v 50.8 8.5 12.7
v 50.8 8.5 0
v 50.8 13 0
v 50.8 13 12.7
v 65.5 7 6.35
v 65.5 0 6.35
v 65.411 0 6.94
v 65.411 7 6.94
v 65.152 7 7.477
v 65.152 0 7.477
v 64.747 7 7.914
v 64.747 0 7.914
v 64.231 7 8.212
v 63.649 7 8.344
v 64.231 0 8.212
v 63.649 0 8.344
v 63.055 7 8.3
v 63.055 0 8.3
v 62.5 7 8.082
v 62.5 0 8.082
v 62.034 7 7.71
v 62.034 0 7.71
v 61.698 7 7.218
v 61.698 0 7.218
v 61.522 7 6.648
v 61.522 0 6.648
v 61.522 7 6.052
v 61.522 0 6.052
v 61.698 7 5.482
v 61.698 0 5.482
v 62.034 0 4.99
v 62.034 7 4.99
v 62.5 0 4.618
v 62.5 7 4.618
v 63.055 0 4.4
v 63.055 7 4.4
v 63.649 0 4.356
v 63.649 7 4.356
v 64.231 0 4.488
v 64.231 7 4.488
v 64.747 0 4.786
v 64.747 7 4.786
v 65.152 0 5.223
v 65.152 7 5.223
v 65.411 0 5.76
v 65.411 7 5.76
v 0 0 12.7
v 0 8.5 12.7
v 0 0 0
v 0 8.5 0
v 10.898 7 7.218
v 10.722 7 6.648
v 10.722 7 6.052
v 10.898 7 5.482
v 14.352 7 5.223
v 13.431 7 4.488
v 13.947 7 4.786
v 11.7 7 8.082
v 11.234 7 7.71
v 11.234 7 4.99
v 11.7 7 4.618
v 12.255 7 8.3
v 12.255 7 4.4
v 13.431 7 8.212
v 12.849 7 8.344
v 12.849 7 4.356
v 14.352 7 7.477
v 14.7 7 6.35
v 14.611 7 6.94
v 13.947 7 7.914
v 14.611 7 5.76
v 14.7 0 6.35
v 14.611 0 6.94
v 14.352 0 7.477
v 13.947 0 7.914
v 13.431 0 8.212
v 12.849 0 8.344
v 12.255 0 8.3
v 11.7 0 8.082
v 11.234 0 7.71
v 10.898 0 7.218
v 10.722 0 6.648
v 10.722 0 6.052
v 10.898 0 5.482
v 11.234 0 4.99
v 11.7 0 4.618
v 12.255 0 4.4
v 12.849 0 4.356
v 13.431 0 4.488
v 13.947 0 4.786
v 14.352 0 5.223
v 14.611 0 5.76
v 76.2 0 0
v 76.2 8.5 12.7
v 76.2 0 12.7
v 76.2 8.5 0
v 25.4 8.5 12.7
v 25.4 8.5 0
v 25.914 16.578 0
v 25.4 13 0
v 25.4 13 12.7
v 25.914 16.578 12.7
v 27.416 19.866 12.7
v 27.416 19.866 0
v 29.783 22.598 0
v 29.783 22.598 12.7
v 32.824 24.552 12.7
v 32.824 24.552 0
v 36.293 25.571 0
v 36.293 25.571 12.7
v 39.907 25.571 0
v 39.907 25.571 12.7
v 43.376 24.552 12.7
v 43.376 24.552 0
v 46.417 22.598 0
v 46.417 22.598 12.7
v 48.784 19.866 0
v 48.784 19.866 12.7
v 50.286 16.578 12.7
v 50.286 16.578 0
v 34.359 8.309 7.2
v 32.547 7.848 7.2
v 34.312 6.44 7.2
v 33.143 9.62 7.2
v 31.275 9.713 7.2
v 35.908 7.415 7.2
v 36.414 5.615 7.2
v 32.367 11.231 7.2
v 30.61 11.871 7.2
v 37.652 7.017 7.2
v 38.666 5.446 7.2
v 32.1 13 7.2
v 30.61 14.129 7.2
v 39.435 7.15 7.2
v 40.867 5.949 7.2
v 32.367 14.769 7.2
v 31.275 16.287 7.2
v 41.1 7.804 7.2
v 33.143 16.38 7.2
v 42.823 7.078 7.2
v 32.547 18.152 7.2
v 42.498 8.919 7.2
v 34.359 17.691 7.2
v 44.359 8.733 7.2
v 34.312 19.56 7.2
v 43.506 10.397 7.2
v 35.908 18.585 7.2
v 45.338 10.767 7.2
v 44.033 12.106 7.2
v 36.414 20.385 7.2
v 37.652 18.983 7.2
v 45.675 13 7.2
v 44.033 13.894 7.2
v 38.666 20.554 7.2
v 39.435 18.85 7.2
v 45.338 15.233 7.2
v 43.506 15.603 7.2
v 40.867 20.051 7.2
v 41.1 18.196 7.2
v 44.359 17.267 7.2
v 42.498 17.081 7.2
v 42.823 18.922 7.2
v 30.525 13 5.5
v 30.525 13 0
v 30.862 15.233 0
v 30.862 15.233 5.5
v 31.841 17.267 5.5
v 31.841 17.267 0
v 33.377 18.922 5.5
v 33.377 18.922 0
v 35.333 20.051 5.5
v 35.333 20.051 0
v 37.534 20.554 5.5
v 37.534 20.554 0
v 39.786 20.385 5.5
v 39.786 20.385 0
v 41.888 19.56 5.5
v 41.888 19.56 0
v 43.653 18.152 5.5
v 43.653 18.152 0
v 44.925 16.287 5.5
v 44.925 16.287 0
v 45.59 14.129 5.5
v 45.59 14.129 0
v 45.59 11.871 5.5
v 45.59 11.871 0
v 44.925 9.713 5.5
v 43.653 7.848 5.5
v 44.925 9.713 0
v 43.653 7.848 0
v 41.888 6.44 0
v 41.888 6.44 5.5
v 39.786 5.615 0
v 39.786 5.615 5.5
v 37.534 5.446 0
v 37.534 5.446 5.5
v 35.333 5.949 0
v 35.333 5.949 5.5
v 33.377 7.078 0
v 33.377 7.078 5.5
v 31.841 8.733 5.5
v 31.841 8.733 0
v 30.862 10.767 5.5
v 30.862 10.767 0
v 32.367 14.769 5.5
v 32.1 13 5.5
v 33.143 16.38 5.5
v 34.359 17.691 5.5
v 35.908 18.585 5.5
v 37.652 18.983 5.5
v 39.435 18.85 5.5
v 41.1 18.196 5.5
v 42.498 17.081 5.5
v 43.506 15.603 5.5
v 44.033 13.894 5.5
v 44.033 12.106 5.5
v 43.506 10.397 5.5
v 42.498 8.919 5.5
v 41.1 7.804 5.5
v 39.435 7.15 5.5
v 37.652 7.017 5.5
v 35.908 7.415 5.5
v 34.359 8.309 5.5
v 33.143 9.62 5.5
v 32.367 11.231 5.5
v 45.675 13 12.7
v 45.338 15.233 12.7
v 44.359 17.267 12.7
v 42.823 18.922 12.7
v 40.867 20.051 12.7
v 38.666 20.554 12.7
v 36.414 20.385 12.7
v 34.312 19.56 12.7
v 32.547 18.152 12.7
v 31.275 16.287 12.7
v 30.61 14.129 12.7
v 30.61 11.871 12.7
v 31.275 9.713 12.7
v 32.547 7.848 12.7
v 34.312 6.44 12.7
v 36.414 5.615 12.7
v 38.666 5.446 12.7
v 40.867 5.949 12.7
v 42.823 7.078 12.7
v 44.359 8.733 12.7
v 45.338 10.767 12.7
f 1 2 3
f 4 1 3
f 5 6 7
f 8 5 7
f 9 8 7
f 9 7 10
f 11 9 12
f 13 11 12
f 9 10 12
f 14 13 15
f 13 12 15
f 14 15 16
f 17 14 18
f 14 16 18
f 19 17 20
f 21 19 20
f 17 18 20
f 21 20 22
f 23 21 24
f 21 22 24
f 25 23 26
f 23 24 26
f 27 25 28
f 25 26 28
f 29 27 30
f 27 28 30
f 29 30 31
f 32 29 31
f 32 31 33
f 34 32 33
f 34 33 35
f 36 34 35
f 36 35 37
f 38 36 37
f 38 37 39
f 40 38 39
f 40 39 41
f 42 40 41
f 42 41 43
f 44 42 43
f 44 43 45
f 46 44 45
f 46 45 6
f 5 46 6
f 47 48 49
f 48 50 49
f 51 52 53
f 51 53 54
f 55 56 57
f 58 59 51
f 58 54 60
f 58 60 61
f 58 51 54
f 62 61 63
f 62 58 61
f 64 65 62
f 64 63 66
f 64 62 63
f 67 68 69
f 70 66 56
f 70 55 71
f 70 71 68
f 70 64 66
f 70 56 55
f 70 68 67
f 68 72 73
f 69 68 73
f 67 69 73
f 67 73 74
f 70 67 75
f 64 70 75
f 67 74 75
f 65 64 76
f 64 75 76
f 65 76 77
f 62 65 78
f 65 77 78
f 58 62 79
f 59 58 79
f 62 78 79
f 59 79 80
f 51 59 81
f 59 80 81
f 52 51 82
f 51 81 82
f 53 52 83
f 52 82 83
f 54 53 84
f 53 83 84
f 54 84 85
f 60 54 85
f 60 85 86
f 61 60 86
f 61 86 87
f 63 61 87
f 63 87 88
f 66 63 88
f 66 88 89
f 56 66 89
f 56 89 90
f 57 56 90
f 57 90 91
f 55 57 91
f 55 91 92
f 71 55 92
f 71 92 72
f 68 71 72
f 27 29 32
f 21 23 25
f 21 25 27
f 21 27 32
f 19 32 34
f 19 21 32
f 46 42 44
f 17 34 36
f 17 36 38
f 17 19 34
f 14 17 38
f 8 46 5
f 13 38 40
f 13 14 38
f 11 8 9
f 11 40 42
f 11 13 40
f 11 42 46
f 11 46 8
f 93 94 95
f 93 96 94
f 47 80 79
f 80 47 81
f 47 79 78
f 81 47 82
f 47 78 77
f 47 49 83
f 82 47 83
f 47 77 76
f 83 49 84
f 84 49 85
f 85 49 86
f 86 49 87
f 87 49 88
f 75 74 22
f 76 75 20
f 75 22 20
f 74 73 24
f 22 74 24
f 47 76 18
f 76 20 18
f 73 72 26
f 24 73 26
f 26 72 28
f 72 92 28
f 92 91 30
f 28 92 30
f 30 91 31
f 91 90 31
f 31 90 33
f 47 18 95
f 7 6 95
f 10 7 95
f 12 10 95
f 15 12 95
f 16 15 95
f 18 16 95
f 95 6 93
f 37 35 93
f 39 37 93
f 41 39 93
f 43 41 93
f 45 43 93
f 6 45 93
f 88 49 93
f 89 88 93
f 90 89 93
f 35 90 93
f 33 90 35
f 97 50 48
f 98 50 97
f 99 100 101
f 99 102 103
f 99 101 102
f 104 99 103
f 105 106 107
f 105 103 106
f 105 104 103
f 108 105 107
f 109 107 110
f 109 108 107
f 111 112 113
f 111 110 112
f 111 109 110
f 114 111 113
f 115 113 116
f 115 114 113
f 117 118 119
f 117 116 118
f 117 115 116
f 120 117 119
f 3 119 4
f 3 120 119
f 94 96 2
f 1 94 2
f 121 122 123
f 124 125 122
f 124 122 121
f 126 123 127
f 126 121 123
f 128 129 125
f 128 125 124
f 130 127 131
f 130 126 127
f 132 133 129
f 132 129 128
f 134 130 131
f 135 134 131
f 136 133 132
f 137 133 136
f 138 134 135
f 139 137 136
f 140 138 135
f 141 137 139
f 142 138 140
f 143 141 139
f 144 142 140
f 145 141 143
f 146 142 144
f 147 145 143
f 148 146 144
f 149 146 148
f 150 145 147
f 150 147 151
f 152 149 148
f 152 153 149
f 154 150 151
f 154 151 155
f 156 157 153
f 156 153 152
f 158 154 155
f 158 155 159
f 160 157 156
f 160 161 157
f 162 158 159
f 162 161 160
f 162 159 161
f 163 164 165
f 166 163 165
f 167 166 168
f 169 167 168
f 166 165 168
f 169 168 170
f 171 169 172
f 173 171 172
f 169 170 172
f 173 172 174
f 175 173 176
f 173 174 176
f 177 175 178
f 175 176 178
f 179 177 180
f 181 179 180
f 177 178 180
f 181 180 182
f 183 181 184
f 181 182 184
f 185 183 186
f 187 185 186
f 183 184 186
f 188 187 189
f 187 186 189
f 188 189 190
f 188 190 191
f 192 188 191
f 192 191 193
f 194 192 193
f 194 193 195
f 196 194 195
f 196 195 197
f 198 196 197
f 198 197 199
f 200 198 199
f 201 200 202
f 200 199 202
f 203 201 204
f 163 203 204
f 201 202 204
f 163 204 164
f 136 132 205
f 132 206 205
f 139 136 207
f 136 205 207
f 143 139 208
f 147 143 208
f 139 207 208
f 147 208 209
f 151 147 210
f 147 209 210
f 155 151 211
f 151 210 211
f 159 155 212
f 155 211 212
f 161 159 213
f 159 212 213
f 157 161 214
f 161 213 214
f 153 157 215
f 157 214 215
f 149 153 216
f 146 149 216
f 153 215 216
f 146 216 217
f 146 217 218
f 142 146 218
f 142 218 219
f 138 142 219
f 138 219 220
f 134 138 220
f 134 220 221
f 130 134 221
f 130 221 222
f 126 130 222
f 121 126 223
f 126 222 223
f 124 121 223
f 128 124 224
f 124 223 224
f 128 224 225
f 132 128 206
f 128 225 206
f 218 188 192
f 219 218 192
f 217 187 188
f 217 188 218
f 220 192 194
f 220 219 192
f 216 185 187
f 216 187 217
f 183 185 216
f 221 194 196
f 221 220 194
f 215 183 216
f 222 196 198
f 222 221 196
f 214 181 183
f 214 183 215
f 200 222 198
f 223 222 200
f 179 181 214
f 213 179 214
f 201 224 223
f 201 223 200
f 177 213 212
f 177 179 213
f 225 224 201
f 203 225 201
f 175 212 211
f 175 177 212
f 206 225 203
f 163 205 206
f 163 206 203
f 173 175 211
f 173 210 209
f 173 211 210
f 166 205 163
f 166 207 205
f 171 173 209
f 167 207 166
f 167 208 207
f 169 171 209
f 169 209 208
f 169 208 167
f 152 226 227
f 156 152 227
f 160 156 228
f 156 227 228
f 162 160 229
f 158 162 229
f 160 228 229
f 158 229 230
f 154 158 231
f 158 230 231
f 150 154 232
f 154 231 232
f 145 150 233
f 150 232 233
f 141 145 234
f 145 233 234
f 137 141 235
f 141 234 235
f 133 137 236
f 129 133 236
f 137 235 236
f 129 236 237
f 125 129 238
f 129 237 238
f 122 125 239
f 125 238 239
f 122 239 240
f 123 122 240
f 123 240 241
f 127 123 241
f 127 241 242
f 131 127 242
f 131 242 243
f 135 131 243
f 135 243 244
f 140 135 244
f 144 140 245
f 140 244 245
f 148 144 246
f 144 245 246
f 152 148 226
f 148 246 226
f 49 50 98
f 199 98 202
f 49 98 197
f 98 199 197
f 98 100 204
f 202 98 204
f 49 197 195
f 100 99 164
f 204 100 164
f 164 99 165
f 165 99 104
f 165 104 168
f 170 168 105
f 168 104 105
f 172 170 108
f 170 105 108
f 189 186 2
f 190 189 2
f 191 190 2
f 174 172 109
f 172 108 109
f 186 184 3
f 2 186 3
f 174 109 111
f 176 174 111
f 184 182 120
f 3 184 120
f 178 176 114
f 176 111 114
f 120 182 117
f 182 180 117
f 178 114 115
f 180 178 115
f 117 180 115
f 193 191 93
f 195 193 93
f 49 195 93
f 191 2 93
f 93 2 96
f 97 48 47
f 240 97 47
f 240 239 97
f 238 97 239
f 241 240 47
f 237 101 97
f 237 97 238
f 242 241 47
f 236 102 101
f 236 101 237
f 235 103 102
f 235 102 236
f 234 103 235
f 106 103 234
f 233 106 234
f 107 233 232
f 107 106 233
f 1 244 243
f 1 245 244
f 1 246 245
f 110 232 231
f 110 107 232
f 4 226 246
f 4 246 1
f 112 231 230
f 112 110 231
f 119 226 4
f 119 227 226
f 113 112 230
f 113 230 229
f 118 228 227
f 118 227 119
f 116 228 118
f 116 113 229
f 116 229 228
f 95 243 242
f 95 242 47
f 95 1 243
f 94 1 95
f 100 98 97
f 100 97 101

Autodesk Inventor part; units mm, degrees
ref_plane "YZ Plane" through (0, 0, 0) normal (1, 0, 0) x (0, 1, 0)
ref_plane "XZ Plane" through (0, 0, 0) normal (0, 1, 0) x (-1, 0, 0)
ref_plane "XY Plane" through (0, 0, 0) normal (0, 0, 1) x (1, 0, 0)
sketch "Sketch1" plane through (0, 0, 0) normal (0, 0, 1) x (1, 0, 0)
  line L0 (0, 0) -> (76.2, 0)
  line L1 (50.8, 8.5) -> (50.8, 13)
  line L2 (25.4, 8.5) -> (25.4, 13)
  arc A0 (50.8, 13) -> (25.4, 13) centre (38.1, 13) ccw
  line L3 (0, 8.5) -> (25.4, 8.5)
  line L4 (76.2, 8.5) -> (50.8, 8.5)
  line L5 (76.2, 8.5) -> (76.2, 0)
  line L6 (0, 8.5) -> (0, 0)
  dimension "d0" = 76.2
  dimension "d4" = 25.4
  dimension "d18" = 13
  dimension "d20" = 25.4
  dimension "d21" = 8.5
  dimension "d22" = 8.5
  dimension "d23" = 12.7
  dimension "d24" = 25.4
  dimension "d25" = 12.7
extrude "BearingBlock" add sketch "Sketch1" along normal blind 12.7
sketch "Sketch2" plane through (0, 0, 12.7) normal (0, 0, 1) x (1, 0, 0)
  arc A0 (50.8, 13) -> (25.4, 13) centre (38.1, 13) ccw projected
  line L0 (0, 0) -> (76.2, 0) projected
  circle A1 centre (38.1, 13) radius 7.575
  point P0 (38.1, 25.7)
  dimension "d8" = 15.15
  dimension "d26" = 13
extrude "BearingMount" cut sketch "Sketch2" against normal blind 5.5
sketch "Sketch4" plane through (0, 0, 0) normal (0, 0, -1) x (-1, 0, 0)
  circle A0 centre (-38.1, 13) radius 7.575 projected
  circle A1 centre (-38.1, 13) radius 7.575
  line L0 (0, 0) -> (-76.2, 0) projected
  dimension "d27" = 15.15
  dimension "d28" = 13
extrude "BearingMount2" cut sketch "Sketch4" against normal blind 5.5
sketch "Sketch3" plane through (0, 0, 0) normal (0, -1, 0) x (1, 0, 0)
  line L0 (0, 0) -> (0, 12.7) projected
  line L1 (-76.2, 6.35) -> (76.2, 6.35) construction
  line L2 (76.2, 0) -> (76.2, 12.7) projected
  circle A0 centre (12.7, 6.35) radius 2
  circle A1 centre (63.5, 6.35) radius 2
  point P0 (0, 6.35)
  dimension "d11" = 12.7
  dimension "d12" = 12.7
  dimension "d13" = 4
  dimension "d14" = 4
  dimension "d15" = 50.8
extrude "HeatSetInsert" cut sketch "Sketch3" against normal blind 7
sketch "Sketch5" plane through (38.1, 13, 5.5) normal (0, 0, -1) x (-1, 0, 0)
  circle A0 centre (0, 0) radius 7.575 projected
  circle A1 centre (0, 0) radius 6
  line L0 (38.1, -13) -> (-38.1, -13) projected
  dimension "d32" = 12
  dimension "d33" = 13
extrude "Extrusion5" cut sketch "Sketch5" against normal through all contours A1
equation "\"d18\" = motor_centerline_height"
equation "\"d13\" = m3_heat_set_insert"
equation "\"d14\" = m3_heat_set_insert"
equation "\"m3_heat_set_insert\" = 4"
equation "\"m3_clearance\" = 3.4"
equation "\"m3_heat_set_depth\" = 7"
equation "\"robot_diameter\" = 354"
equation "\"hardboard_thickness\" = 5"
equation "\"motor_centerline_height\" = 13"
properties part number "wheel_bearing_no_flange"
